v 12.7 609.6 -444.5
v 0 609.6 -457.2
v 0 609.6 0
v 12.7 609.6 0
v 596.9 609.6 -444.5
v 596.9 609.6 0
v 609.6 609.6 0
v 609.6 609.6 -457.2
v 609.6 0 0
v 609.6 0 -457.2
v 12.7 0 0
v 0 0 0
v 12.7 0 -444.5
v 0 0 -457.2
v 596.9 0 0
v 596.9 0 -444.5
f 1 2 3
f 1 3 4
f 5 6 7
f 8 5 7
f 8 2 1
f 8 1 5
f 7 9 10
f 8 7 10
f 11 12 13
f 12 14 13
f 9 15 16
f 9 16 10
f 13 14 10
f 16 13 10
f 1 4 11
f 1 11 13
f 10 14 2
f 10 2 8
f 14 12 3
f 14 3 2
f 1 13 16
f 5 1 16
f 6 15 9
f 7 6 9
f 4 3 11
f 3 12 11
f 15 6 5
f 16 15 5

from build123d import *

# Parameters (mm, degrees)
SKETCH1_W           = 609.6
SKETCH1_H           = 457.2
BOSS_EXTRUDE1_DEPTH = 609.6
SHELL1_T            = -12.7


with BuildPart() as part:
    # Sketch1 → Boss-Extrude1 (new body)
    with BuildSketch(Plane(origin=(0, 0, 0), x_dir=(1, 0, 0), z_dir=(0, 1, 0))):
        with Locations((304.8, 228.6)):
            Rectangle(SKETCH1_W, SKETCH1_H)
    extrude(amount=BOSS_EXTRUDE1_DEPTH)

    # Shell1
    shell1_openings = [part.faces().sort_by_distance(p)[0] for p in [
        (304.8, 609.6, -228.6),
        (304.8, 0, -228.6),
        (304.8, 304.8, 0),
    ]]
    offset(amount=SHELL1_T, openings=shell1_openings, kind=Kind.INTERSECTION)


solid = part.part
